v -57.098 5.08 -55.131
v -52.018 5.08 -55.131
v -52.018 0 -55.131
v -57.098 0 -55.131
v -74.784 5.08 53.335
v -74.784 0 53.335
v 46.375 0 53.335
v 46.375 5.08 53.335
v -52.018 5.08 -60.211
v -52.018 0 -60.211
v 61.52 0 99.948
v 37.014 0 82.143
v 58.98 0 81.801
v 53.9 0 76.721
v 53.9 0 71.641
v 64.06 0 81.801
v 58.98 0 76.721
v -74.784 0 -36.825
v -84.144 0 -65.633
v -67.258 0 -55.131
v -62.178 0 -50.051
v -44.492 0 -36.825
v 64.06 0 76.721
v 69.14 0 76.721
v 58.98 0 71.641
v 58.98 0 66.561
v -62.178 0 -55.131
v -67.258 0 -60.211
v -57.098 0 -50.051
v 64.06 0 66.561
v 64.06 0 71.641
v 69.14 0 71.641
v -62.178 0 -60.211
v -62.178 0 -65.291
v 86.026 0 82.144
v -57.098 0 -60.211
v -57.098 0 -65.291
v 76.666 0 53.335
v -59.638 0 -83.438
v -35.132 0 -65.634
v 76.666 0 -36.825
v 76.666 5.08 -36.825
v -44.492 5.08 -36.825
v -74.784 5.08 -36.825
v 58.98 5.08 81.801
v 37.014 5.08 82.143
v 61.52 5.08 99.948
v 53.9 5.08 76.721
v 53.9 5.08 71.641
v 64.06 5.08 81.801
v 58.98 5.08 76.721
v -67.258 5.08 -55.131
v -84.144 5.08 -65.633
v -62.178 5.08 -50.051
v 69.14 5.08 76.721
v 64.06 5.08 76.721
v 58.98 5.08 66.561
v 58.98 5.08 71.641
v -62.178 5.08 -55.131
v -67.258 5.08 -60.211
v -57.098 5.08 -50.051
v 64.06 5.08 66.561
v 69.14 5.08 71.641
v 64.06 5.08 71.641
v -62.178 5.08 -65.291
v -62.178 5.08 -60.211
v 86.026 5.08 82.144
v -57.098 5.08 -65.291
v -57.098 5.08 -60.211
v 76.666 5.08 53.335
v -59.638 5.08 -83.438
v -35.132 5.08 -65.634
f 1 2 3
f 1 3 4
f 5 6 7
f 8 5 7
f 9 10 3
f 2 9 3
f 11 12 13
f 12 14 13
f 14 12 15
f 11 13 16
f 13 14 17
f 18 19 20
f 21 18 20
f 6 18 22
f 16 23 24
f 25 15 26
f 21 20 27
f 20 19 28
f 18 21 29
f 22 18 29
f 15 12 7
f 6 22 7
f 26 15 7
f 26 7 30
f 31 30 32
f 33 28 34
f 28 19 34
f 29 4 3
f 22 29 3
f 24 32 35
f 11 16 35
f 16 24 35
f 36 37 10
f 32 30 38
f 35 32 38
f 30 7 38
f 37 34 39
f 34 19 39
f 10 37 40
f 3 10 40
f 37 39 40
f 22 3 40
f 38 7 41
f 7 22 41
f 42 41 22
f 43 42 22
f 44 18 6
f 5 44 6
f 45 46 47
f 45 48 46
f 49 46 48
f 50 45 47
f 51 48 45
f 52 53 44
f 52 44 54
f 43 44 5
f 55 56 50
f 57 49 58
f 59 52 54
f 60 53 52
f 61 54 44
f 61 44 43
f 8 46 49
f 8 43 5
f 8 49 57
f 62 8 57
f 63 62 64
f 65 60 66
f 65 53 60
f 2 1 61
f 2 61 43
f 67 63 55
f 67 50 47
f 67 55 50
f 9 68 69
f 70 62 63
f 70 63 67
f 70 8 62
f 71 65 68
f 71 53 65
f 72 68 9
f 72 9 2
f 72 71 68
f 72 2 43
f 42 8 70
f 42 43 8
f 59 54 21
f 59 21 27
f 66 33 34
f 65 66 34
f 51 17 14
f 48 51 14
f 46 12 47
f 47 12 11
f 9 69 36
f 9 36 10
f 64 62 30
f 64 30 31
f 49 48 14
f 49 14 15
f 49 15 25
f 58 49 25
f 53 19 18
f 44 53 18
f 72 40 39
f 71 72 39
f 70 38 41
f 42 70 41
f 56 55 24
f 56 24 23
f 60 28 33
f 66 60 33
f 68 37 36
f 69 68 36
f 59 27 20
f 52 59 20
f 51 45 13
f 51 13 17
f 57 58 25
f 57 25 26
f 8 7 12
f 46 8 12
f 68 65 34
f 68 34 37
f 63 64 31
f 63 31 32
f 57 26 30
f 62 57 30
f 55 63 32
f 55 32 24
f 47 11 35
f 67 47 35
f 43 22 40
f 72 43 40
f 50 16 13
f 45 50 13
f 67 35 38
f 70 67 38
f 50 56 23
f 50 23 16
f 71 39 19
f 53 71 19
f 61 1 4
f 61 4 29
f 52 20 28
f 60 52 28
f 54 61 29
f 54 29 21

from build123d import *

# Parameters (mm, degrees)
BOSS_EXTRUDE1_DEPTH = 5.08


with BuildPart() as part:
    # Sketch1 → Boss-Extrude1 (new body)
    with BuildSketch(Plane(origin=(0, 0, 0), x_dir=(1, 0, 0), z_dir=(0, 1, 0))):
        Polygon((-74.783670705, 36.824993776), (-74.783670705, -53.334846224), (46.37500358, -53.334846224), (37.014119661, -82.142609318), (61.519803774, -99.947823692), (86.026241778, -82.14364696), (76.666369295, -53.334846224), (76.666369295, 36.824993776), (-44.491630705, 36.824993776), (-35.131758222, 65.633794512), (-59.638196226, 83.437971244), (-84.143880339, 65.63275687), align=None)
        Polygon((-59.637650705, 65.290773776), (-57.097650705, 65.290773776), (-57.097650705, 60.210773776), (-52.017650705, 60.210773776), (-52.017650705, 57.670773776), (-52.017650705, 55.130773776), (-57.097650705, 55.130773776), (-57.097650705, 50.050773776), (-59.637650705, 50.050773776), (-62.177650705, 50.050773776), (-62.177650705, 55.130773776), (-67.257650705, 55.130773776), (-67.257650705, 57.670773776), (-67.257650705, 60.210773776), (-62.177650705, 60.210773776), (-62.177650705, 65.290773776), align=None, mode=Mode.SUBTRACT)
        Polygon((69.140349295, -74.180626224), (69.140349295, -76.720626224), (64.060349295, -76.720626224), (64.060349295, -81.800626224), (61.520349295, -81.800626224), (58.980349295, -81.800626224), (58.980349295, -76.720626224), (53.900349295, -76.720626224), (53.900349295, -74.180626224), (53.900349295, -71.640626224), (58.980349295, -71.640626224), (58.980349295, -66.560626224), (61.520349295, -66.560626224), (64.060349295, -66.560626224), (64.060349295, -71.640626224), (69.140349295, -71.640626224), align=None, mode=Mode.SUBTRACT)
    extrude(amount=BOSS_EXTRUDE1_DEPTH)


solid = part.part
